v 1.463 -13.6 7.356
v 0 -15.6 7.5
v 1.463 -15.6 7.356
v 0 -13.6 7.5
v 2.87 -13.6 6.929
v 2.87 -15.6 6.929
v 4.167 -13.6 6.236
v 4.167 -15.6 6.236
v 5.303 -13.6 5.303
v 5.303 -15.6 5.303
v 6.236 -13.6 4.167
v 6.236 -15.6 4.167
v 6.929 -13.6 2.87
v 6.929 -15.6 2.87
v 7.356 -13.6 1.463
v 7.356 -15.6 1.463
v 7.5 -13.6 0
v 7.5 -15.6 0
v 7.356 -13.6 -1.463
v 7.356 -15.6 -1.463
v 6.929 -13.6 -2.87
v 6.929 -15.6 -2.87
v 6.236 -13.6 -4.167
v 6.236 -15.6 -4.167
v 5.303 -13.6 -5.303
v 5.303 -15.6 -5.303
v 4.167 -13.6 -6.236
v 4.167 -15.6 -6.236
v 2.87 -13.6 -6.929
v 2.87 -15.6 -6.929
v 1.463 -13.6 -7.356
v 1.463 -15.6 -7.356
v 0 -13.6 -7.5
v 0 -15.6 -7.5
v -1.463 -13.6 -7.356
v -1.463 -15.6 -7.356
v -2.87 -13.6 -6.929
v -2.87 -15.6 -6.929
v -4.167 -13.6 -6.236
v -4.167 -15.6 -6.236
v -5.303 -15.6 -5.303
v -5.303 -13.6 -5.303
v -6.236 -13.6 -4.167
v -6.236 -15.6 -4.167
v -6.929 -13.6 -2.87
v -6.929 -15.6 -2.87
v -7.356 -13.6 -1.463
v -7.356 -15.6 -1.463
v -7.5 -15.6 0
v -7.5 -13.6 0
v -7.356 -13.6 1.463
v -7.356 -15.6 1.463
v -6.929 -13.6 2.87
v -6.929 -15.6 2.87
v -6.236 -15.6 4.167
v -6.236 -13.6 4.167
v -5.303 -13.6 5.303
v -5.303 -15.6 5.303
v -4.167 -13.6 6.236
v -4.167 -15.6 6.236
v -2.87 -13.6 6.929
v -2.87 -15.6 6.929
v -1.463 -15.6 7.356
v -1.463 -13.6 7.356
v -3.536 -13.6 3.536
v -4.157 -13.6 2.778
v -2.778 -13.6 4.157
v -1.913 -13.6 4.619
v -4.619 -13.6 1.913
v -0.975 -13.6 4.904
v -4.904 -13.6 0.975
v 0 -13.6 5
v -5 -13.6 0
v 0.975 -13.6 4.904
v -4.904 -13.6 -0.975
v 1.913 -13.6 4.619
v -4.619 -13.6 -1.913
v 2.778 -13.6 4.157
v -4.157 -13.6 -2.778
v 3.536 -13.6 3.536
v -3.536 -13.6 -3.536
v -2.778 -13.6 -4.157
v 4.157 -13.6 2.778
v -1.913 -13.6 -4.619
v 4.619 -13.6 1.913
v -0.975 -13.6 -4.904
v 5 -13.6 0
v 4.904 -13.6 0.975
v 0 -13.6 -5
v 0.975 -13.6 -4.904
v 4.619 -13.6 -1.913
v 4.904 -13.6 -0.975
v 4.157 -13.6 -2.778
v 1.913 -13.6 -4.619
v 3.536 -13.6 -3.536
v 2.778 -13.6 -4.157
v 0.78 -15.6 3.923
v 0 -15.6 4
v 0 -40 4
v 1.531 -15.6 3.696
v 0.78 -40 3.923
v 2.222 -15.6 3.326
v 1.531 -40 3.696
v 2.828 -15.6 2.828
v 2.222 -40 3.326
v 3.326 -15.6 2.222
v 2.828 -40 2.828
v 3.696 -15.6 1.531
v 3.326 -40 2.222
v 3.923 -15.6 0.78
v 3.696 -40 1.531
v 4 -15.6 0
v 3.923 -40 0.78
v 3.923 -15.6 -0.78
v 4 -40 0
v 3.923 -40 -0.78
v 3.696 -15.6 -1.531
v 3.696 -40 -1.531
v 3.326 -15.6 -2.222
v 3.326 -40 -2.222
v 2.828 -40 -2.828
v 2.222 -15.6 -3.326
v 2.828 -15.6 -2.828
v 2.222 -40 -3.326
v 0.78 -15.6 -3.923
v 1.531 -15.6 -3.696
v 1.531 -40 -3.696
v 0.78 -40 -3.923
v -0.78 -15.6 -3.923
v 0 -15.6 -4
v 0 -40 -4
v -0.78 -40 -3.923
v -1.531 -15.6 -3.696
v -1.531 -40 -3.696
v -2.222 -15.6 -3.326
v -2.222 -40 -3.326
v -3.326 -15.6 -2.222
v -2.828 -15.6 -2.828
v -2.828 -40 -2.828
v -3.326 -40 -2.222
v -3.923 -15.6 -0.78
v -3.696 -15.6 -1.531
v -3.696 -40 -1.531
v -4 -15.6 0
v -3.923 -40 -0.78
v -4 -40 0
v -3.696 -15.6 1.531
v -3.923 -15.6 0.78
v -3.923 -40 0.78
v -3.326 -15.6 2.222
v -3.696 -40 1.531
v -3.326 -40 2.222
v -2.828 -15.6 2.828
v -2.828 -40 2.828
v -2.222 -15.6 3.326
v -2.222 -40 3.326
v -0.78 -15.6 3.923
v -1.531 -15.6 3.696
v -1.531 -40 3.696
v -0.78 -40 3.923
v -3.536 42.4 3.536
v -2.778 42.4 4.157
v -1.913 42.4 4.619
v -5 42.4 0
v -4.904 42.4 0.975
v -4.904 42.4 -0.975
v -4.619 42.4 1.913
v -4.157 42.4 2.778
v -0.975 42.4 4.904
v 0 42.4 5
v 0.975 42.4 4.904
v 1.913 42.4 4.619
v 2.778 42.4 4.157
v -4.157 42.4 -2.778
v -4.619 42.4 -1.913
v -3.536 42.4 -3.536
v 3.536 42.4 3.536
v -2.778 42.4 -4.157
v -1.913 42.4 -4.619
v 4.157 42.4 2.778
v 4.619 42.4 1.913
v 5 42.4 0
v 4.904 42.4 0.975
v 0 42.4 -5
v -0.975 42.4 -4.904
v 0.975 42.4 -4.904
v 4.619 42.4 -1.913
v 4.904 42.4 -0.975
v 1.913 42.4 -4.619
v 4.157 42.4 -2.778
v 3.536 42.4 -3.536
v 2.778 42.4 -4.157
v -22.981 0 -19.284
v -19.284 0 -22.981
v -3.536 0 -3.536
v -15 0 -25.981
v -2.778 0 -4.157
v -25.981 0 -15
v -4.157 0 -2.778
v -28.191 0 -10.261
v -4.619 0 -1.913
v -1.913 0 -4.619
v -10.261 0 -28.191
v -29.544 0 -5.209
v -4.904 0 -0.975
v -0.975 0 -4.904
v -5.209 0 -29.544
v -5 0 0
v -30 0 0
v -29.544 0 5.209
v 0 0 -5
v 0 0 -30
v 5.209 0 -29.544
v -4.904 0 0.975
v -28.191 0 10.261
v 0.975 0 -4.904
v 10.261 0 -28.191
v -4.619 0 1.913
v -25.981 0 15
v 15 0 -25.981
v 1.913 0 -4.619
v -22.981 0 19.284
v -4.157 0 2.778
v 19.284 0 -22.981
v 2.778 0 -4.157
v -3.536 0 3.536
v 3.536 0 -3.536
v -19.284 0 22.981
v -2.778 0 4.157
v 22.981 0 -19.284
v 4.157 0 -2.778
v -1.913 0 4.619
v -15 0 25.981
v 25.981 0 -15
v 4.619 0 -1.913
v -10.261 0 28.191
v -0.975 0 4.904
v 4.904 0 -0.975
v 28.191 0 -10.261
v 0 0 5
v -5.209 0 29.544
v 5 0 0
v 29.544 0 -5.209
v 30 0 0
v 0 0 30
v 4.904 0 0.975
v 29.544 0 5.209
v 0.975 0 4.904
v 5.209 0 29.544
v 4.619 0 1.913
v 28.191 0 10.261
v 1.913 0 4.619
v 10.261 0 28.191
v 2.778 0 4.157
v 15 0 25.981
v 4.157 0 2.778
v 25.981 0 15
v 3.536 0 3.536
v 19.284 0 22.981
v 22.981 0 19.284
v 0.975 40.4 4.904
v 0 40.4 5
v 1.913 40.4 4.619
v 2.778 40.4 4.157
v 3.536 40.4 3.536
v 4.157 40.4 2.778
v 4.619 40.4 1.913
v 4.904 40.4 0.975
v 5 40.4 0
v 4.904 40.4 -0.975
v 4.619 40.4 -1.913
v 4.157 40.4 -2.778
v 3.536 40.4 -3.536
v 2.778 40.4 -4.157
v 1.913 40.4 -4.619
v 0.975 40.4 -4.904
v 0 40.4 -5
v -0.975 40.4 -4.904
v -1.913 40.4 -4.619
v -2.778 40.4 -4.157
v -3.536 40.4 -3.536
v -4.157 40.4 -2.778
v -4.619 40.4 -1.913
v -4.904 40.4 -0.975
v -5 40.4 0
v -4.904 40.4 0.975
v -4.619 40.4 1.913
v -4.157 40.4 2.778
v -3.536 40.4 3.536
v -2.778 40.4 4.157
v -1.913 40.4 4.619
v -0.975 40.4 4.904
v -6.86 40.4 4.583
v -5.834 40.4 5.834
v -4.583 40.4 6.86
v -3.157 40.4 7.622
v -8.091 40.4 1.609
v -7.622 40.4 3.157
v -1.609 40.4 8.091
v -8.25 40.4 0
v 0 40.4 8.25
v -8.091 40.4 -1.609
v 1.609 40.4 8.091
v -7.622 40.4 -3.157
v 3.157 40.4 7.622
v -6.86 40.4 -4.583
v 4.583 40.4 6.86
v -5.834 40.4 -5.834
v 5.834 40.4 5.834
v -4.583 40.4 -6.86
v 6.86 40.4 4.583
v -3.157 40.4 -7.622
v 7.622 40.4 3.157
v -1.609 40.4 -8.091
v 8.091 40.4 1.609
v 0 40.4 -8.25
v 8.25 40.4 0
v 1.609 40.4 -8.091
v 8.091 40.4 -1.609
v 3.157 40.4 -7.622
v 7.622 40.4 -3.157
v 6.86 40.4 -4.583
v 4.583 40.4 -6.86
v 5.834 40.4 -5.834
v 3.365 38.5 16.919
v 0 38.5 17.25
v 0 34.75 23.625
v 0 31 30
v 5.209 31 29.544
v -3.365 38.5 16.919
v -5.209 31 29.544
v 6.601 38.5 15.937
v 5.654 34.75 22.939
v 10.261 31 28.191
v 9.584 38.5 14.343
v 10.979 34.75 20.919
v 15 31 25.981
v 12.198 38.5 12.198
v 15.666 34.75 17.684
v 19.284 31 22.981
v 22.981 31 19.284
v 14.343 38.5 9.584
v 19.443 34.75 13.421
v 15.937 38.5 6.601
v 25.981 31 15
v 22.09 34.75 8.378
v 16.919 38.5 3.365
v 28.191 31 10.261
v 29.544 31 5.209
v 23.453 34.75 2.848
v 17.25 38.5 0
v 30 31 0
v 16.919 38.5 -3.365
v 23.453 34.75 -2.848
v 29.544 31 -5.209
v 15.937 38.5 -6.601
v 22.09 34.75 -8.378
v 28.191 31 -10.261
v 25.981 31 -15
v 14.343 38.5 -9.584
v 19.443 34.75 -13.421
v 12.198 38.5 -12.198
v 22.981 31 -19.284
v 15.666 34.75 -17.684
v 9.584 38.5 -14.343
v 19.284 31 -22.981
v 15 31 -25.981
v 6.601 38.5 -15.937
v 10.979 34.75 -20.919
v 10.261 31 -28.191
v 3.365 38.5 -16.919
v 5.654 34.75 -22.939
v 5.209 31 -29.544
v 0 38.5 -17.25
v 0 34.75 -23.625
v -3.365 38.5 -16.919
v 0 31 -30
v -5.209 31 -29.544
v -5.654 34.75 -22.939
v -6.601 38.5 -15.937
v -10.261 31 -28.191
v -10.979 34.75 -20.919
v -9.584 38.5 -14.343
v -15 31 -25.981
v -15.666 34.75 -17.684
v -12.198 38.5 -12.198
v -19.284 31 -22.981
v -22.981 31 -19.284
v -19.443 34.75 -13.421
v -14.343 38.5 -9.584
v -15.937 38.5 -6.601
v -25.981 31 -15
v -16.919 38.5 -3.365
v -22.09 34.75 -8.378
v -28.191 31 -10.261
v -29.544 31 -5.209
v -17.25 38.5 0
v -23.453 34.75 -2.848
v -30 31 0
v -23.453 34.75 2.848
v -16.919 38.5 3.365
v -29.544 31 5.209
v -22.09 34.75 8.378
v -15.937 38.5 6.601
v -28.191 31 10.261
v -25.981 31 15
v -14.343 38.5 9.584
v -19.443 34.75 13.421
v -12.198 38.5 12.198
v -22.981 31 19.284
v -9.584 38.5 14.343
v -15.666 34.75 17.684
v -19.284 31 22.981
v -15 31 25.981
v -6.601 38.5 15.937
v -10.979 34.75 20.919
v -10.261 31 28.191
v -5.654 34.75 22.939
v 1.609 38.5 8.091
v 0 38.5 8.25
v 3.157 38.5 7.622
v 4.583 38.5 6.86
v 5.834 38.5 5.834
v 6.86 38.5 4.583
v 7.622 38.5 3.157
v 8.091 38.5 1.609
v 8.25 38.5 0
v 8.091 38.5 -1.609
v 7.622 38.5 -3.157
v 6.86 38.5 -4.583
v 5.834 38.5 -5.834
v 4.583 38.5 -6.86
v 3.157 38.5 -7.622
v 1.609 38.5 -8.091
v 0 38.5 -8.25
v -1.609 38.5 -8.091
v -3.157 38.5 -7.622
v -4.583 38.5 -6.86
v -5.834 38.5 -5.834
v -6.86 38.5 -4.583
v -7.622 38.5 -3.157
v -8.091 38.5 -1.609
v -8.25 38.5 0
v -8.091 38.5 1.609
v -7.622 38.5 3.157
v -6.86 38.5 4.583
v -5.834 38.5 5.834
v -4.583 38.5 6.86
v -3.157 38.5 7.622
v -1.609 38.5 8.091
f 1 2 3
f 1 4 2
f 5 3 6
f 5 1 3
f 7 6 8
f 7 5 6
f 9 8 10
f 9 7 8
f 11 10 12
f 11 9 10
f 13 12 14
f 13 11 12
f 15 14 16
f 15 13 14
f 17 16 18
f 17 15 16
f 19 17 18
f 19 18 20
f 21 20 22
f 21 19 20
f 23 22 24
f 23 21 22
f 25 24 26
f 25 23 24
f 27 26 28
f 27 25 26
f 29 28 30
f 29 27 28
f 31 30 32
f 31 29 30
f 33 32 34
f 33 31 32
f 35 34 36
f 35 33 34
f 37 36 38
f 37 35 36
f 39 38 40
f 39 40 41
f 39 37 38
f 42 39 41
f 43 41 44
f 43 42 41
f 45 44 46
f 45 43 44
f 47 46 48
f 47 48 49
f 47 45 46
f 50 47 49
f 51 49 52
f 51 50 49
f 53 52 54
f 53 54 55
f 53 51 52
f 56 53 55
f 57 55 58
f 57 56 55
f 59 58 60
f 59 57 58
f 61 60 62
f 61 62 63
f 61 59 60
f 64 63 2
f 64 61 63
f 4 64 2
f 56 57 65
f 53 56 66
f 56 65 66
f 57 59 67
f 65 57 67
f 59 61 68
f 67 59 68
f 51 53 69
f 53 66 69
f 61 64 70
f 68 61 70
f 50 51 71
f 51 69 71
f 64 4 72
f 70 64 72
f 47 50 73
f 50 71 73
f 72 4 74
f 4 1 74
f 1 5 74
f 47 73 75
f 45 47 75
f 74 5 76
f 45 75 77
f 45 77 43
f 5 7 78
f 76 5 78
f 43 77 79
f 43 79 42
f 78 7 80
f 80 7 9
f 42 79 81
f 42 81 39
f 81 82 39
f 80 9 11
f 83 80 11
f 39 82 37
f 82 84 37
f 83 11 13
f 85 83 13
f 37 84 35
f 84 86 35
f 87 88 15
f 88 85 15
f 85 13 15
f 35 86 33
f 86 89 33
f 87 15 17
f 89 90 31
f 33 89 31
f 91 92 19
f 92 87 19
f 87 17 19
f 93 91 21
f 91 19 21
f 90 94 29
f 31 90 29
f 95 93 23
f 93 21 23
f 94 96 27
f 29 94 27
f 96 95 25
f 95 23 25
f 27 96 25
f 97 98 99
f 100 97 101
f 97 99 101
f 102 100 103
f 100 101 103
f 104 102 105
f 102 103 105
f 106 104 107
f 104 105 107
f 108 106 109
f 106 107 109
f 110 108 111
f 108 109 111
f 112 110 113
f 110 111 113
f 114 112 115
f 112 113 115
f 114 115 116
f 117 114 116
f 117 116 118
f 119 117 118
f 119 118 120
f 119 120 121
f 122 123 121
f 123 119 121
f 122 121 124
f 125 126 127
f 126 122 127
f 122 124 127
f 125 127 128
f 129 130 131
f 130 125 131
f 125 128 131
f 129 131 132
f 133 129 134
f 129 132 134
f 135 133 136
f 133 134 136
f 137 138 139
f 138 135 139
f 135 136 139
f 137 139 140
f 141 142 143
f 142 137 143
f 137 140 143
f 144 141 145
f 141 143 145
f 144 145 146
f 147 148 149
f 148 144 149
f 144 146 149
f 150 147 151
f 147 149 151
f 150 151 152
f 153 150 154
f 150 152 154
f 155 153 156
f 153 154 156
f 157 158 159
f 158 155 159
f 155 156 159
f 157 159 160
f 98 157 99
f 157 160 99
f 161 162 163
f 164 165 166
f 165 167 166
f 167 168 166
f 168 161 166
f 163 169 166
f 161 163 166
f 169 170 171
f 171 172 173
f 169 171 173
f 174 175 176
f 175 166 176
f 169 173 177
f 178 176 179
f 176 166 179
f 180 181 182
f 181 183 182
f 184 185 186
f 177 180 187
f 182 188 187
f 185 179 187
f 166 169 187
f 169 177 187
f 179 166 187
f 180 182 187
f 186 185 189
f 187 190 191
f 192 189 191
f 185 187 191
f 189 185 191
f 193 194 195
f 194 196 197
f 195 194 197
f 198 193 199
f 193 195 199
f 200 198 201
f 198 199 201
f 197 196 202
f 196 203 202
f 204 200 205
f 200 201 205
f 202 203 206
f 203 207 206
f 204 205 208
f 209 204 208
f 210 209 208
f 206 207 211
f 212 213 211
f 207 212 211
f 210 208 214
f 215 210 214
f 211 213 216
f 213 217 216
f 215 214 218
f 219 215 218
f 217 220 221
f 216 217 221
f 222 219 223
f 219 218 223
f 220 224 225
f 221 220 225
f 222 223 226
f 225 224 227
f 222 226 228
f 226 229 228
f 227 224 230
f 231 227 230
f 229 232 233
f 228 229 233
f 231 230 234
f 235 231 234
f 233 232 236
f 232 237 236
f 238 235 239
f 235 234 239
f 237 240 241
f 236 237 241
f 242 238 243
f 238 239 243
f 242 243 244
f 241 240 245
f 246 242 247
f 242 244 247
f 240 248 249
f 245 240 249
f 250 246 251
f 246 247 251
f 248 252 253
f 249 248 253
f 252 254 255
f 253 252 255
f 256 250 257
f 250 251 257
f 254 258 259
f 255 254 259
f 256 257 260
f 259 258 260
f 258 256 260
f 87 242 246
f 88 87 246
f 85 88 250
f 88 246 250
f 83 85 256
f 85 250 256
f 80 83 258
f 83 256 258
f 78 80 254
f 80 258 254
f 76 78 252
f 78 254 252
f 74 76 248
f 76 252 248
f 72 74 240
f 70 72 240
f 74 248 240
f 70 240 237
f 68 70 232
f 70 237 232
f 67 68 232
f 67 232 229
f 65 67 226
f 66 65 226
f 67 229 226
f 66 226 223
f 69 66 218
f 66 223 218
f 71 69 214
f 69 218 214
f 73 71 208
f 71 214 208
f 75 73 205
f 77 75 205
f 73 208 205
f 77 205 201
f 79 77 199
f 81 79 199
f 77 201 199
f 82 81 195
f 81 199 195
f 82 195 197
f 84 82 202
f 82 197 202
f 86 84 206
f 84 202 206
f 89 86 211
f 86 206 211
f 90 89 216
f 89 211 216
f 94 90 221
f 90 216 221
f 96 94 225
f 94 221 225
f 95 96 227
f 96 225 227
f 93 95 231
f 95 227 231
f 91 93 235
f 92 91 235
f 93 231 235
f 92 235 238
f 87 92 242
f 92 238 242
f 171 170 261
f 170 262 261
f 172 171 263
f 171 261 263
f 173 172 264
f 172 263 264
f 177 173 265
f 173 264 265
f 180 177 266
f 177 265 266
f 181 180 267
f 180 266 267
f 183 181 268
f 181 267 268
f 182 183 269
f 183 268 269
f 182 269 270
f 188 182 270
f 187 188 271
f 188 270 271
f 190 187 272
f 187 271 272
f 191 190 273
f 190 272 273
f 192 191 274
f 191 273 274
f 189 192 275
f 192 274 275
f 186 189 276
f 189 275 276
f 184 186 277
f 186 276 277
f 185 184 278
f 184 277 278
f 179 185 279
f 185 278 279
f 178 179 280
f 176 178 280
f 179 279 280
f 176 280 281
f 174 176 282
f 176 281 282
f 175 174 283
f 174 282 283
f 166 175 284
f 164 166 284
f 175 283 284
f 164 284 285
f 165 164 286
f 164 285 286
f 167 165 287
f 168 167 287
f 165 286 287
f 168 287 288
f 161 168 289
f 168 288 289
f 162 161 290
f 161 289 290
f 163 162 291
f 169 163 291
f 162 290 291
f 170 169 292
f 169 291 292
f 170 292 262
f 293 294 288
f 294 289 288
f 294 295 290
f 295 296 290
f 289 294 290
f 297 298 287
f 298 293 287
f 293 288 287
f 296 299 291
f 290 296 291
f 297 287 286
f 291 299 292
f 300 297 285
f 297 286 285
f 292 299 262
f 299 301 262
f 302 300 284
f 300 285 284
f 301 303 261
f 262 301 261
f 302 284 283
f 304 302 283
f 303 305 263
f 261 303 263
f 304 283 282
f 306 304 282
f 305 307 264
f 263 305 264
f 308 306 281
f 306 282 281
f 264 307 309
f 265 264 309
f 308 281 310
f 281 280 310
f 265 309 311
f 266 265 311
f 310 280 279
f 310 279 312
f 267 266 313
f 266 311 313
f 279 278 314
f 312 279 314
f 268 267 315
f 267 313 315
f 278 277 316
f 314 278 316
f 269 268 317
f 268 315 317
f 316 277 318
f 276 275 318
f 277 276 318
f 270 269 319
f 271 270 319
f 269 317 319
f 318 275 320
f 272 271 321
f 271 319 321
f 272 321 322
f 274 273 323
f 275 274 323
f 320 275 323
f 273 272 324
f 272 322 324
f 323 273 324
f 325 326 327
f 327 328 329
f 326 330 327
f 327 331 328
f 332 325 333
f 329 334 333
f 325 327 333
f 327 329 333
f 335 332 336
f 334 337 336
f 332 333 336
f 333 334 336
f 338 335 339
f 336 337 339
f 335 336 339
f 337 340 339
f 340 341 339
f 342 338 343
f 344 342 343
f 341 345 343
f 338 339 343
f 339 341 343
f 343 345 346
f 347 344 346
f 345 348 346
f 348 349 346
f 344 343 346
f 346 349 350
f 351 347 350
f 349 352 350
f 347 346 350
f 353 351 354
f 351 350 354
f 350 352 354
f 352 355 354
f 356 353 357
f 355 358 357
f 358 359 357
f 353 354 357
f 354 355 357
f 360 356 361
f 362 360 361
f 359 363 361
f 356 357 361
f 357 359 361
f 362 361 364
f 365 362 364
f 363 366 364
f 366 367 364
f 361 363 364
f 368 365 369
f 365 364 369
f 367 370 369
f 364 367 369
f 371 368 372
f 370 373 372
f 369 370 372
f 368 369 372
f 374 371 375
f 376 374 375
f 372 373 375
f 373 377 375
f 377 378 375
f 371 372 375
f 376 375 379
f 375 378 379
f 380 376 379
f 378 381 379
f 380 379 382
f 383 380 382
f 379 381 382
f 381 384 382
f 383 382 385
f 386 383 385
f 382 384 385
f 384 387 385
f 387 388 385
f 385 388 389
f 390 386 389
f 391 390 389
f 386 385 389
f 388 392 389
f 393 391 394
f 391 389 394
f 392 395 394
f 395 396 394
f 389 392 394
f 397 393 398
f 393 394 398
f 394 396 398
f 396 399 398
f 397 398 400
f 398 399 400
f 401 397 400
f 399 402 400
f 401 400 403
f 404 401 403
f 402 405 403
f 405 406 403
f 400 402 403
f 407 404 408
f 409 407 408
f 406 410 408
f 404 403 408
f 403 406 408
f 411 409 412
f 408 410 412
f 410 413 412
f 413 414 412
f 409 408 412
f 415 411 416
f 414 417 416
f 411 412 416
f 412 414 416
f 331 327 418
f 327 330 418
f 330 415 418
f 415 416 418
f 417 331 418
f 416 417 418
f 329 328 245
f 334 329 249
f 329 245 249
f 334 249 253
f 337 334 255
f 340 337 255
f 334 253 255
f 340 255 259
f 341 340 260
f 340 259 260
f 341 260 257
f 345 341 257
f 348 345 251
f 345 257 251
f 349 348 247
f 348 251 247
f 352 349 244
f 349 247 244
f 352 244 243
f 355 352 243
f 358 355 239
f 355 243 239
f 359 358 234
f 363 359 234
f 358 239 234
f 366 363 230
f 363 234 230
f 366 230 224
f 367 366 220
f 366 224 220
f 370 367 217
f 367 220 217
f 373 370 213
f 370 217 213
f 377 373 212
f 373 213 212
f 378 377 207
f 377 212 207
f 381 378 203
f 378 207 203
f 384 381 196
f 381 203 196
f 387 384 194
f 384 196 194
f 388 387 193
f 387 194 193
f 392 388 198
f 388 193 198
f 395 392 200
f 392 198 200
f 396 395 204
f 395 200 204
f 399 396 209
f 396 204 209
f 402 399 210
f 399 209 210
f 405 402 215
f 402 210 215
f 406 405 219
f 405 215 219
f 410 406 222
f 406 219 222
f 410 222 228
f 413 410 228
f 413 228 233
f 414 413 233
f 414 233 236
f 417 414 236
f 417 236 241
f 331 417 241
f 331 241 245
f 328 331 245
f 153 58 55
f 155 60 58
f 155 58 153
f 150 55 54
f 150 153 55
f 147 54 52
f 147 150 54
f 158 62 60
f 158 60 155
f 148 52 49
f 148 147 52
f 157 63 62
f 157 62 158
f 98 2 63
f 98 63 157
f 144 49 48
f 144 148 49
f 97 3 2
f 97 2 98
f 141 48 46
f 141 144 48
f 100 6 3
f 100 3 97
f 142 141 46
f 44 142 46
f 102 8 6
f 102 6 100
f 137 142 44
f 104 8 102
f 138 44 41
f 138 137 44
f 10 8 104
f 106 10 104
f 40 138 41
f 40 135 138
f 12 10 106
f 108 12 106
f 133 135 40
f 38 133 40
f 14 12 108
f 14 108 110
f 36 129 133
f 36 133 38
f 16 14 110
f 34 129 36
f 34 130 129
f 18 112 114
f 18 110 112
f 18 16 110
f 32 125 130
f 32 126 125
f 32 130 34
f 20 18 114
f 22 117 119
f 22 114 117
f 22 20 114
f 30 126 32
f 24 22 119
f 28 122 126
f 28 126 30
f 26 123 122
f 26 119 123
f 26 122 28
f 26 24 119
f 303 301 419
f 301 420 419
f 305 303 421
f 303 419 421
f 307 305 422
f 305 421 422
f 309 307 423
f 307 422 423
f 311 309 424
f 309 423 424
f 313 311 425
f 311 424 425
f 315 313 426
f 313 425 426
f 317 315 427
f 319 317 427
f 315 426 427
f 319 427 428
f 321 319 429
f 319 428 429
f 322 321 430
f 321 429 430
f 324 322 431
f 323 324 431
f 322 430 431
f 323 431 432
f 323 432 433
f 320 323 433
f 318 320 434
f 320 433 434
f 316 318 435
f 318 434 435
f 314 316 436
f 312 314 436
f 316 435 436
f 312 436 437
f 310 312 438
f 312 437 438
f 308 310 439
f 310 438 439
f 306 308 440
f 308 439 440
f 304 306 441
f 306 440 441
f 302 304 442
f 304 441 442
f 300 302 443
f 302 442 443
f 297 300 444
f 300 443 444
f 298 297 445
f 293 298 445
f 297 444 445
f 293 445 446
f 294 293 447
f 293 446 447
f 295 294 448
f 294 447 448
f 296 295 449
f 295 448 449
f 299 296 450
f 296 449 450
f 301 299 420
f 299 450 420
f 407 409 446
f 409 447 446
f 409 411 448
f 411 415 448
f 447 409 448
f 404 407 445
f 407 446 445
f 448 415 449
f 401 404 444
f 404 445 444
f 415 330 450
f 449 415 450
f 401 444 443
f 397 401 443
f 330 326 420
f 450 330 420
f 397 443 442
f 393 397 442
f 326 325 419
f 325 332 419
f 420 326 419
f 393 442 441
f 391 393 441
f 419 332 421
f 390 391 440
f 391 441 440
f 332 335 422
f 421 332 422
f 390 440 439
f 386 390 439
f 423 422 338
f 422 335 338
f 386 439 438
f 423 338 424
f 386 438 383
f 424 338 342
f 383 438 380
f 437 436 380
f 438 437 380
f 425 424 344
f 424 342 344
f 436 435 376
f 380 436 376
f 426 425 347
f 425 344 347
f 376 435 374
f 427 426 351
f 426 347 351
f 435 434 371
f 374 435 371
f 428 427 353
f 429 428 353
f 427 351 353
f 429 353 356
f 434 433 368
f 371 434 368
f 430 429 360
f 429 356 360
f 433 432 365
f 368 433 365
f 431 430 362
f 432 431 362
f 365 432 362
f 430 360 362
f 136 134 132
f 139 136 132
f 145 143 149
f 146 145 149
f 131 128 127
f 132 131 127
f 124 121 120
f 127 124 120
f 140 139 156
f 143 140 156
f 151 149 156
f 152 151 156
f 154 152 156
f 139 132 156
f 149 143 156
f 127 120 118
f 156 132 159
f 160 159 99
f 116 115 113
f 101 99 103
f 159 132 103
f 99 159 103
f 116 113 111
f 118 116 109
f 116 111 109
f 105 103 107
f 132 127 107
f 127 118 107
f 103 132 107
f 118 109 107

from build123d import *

# Parameters (mm, degrees)
F2_R     = 5
F3_DEPTH = 13.6
F4_W     = 2
F4_H     = 7.5


with BuildPart() as f1:
    # F0 (on Right) → F1 (revolve)
    with BuildSketch(Plane.YZ):
        Polygon((-40, 4), (-40, 0), (42.4, 0), (42.4, 5), (40.4, 5), (40.4, 8.25), (38.5, 8.25), (38.5, 17.25), (31, 30), (0, 30), (0, 4), align=None)
    revolve(axis=Axis((0, 1.2, 0), (0, 1, 0)))

    # F2 (on face) → F3 (join)
    with BuildSketch(Plane.XZ):
        Circle(F2_R)
    extrude(amount=F3_DEPTH)

    # F4 (on Right) → F5 (revolve)
    with BuildSketch(Plane.YZ):
        with Locations((-14.6, 3.75)):
            Rectangle(F4_W, F4_H)
    revolve(axis=Axis((0, -14.6, 0), (0, 1, 0)))


solid = f1.part
